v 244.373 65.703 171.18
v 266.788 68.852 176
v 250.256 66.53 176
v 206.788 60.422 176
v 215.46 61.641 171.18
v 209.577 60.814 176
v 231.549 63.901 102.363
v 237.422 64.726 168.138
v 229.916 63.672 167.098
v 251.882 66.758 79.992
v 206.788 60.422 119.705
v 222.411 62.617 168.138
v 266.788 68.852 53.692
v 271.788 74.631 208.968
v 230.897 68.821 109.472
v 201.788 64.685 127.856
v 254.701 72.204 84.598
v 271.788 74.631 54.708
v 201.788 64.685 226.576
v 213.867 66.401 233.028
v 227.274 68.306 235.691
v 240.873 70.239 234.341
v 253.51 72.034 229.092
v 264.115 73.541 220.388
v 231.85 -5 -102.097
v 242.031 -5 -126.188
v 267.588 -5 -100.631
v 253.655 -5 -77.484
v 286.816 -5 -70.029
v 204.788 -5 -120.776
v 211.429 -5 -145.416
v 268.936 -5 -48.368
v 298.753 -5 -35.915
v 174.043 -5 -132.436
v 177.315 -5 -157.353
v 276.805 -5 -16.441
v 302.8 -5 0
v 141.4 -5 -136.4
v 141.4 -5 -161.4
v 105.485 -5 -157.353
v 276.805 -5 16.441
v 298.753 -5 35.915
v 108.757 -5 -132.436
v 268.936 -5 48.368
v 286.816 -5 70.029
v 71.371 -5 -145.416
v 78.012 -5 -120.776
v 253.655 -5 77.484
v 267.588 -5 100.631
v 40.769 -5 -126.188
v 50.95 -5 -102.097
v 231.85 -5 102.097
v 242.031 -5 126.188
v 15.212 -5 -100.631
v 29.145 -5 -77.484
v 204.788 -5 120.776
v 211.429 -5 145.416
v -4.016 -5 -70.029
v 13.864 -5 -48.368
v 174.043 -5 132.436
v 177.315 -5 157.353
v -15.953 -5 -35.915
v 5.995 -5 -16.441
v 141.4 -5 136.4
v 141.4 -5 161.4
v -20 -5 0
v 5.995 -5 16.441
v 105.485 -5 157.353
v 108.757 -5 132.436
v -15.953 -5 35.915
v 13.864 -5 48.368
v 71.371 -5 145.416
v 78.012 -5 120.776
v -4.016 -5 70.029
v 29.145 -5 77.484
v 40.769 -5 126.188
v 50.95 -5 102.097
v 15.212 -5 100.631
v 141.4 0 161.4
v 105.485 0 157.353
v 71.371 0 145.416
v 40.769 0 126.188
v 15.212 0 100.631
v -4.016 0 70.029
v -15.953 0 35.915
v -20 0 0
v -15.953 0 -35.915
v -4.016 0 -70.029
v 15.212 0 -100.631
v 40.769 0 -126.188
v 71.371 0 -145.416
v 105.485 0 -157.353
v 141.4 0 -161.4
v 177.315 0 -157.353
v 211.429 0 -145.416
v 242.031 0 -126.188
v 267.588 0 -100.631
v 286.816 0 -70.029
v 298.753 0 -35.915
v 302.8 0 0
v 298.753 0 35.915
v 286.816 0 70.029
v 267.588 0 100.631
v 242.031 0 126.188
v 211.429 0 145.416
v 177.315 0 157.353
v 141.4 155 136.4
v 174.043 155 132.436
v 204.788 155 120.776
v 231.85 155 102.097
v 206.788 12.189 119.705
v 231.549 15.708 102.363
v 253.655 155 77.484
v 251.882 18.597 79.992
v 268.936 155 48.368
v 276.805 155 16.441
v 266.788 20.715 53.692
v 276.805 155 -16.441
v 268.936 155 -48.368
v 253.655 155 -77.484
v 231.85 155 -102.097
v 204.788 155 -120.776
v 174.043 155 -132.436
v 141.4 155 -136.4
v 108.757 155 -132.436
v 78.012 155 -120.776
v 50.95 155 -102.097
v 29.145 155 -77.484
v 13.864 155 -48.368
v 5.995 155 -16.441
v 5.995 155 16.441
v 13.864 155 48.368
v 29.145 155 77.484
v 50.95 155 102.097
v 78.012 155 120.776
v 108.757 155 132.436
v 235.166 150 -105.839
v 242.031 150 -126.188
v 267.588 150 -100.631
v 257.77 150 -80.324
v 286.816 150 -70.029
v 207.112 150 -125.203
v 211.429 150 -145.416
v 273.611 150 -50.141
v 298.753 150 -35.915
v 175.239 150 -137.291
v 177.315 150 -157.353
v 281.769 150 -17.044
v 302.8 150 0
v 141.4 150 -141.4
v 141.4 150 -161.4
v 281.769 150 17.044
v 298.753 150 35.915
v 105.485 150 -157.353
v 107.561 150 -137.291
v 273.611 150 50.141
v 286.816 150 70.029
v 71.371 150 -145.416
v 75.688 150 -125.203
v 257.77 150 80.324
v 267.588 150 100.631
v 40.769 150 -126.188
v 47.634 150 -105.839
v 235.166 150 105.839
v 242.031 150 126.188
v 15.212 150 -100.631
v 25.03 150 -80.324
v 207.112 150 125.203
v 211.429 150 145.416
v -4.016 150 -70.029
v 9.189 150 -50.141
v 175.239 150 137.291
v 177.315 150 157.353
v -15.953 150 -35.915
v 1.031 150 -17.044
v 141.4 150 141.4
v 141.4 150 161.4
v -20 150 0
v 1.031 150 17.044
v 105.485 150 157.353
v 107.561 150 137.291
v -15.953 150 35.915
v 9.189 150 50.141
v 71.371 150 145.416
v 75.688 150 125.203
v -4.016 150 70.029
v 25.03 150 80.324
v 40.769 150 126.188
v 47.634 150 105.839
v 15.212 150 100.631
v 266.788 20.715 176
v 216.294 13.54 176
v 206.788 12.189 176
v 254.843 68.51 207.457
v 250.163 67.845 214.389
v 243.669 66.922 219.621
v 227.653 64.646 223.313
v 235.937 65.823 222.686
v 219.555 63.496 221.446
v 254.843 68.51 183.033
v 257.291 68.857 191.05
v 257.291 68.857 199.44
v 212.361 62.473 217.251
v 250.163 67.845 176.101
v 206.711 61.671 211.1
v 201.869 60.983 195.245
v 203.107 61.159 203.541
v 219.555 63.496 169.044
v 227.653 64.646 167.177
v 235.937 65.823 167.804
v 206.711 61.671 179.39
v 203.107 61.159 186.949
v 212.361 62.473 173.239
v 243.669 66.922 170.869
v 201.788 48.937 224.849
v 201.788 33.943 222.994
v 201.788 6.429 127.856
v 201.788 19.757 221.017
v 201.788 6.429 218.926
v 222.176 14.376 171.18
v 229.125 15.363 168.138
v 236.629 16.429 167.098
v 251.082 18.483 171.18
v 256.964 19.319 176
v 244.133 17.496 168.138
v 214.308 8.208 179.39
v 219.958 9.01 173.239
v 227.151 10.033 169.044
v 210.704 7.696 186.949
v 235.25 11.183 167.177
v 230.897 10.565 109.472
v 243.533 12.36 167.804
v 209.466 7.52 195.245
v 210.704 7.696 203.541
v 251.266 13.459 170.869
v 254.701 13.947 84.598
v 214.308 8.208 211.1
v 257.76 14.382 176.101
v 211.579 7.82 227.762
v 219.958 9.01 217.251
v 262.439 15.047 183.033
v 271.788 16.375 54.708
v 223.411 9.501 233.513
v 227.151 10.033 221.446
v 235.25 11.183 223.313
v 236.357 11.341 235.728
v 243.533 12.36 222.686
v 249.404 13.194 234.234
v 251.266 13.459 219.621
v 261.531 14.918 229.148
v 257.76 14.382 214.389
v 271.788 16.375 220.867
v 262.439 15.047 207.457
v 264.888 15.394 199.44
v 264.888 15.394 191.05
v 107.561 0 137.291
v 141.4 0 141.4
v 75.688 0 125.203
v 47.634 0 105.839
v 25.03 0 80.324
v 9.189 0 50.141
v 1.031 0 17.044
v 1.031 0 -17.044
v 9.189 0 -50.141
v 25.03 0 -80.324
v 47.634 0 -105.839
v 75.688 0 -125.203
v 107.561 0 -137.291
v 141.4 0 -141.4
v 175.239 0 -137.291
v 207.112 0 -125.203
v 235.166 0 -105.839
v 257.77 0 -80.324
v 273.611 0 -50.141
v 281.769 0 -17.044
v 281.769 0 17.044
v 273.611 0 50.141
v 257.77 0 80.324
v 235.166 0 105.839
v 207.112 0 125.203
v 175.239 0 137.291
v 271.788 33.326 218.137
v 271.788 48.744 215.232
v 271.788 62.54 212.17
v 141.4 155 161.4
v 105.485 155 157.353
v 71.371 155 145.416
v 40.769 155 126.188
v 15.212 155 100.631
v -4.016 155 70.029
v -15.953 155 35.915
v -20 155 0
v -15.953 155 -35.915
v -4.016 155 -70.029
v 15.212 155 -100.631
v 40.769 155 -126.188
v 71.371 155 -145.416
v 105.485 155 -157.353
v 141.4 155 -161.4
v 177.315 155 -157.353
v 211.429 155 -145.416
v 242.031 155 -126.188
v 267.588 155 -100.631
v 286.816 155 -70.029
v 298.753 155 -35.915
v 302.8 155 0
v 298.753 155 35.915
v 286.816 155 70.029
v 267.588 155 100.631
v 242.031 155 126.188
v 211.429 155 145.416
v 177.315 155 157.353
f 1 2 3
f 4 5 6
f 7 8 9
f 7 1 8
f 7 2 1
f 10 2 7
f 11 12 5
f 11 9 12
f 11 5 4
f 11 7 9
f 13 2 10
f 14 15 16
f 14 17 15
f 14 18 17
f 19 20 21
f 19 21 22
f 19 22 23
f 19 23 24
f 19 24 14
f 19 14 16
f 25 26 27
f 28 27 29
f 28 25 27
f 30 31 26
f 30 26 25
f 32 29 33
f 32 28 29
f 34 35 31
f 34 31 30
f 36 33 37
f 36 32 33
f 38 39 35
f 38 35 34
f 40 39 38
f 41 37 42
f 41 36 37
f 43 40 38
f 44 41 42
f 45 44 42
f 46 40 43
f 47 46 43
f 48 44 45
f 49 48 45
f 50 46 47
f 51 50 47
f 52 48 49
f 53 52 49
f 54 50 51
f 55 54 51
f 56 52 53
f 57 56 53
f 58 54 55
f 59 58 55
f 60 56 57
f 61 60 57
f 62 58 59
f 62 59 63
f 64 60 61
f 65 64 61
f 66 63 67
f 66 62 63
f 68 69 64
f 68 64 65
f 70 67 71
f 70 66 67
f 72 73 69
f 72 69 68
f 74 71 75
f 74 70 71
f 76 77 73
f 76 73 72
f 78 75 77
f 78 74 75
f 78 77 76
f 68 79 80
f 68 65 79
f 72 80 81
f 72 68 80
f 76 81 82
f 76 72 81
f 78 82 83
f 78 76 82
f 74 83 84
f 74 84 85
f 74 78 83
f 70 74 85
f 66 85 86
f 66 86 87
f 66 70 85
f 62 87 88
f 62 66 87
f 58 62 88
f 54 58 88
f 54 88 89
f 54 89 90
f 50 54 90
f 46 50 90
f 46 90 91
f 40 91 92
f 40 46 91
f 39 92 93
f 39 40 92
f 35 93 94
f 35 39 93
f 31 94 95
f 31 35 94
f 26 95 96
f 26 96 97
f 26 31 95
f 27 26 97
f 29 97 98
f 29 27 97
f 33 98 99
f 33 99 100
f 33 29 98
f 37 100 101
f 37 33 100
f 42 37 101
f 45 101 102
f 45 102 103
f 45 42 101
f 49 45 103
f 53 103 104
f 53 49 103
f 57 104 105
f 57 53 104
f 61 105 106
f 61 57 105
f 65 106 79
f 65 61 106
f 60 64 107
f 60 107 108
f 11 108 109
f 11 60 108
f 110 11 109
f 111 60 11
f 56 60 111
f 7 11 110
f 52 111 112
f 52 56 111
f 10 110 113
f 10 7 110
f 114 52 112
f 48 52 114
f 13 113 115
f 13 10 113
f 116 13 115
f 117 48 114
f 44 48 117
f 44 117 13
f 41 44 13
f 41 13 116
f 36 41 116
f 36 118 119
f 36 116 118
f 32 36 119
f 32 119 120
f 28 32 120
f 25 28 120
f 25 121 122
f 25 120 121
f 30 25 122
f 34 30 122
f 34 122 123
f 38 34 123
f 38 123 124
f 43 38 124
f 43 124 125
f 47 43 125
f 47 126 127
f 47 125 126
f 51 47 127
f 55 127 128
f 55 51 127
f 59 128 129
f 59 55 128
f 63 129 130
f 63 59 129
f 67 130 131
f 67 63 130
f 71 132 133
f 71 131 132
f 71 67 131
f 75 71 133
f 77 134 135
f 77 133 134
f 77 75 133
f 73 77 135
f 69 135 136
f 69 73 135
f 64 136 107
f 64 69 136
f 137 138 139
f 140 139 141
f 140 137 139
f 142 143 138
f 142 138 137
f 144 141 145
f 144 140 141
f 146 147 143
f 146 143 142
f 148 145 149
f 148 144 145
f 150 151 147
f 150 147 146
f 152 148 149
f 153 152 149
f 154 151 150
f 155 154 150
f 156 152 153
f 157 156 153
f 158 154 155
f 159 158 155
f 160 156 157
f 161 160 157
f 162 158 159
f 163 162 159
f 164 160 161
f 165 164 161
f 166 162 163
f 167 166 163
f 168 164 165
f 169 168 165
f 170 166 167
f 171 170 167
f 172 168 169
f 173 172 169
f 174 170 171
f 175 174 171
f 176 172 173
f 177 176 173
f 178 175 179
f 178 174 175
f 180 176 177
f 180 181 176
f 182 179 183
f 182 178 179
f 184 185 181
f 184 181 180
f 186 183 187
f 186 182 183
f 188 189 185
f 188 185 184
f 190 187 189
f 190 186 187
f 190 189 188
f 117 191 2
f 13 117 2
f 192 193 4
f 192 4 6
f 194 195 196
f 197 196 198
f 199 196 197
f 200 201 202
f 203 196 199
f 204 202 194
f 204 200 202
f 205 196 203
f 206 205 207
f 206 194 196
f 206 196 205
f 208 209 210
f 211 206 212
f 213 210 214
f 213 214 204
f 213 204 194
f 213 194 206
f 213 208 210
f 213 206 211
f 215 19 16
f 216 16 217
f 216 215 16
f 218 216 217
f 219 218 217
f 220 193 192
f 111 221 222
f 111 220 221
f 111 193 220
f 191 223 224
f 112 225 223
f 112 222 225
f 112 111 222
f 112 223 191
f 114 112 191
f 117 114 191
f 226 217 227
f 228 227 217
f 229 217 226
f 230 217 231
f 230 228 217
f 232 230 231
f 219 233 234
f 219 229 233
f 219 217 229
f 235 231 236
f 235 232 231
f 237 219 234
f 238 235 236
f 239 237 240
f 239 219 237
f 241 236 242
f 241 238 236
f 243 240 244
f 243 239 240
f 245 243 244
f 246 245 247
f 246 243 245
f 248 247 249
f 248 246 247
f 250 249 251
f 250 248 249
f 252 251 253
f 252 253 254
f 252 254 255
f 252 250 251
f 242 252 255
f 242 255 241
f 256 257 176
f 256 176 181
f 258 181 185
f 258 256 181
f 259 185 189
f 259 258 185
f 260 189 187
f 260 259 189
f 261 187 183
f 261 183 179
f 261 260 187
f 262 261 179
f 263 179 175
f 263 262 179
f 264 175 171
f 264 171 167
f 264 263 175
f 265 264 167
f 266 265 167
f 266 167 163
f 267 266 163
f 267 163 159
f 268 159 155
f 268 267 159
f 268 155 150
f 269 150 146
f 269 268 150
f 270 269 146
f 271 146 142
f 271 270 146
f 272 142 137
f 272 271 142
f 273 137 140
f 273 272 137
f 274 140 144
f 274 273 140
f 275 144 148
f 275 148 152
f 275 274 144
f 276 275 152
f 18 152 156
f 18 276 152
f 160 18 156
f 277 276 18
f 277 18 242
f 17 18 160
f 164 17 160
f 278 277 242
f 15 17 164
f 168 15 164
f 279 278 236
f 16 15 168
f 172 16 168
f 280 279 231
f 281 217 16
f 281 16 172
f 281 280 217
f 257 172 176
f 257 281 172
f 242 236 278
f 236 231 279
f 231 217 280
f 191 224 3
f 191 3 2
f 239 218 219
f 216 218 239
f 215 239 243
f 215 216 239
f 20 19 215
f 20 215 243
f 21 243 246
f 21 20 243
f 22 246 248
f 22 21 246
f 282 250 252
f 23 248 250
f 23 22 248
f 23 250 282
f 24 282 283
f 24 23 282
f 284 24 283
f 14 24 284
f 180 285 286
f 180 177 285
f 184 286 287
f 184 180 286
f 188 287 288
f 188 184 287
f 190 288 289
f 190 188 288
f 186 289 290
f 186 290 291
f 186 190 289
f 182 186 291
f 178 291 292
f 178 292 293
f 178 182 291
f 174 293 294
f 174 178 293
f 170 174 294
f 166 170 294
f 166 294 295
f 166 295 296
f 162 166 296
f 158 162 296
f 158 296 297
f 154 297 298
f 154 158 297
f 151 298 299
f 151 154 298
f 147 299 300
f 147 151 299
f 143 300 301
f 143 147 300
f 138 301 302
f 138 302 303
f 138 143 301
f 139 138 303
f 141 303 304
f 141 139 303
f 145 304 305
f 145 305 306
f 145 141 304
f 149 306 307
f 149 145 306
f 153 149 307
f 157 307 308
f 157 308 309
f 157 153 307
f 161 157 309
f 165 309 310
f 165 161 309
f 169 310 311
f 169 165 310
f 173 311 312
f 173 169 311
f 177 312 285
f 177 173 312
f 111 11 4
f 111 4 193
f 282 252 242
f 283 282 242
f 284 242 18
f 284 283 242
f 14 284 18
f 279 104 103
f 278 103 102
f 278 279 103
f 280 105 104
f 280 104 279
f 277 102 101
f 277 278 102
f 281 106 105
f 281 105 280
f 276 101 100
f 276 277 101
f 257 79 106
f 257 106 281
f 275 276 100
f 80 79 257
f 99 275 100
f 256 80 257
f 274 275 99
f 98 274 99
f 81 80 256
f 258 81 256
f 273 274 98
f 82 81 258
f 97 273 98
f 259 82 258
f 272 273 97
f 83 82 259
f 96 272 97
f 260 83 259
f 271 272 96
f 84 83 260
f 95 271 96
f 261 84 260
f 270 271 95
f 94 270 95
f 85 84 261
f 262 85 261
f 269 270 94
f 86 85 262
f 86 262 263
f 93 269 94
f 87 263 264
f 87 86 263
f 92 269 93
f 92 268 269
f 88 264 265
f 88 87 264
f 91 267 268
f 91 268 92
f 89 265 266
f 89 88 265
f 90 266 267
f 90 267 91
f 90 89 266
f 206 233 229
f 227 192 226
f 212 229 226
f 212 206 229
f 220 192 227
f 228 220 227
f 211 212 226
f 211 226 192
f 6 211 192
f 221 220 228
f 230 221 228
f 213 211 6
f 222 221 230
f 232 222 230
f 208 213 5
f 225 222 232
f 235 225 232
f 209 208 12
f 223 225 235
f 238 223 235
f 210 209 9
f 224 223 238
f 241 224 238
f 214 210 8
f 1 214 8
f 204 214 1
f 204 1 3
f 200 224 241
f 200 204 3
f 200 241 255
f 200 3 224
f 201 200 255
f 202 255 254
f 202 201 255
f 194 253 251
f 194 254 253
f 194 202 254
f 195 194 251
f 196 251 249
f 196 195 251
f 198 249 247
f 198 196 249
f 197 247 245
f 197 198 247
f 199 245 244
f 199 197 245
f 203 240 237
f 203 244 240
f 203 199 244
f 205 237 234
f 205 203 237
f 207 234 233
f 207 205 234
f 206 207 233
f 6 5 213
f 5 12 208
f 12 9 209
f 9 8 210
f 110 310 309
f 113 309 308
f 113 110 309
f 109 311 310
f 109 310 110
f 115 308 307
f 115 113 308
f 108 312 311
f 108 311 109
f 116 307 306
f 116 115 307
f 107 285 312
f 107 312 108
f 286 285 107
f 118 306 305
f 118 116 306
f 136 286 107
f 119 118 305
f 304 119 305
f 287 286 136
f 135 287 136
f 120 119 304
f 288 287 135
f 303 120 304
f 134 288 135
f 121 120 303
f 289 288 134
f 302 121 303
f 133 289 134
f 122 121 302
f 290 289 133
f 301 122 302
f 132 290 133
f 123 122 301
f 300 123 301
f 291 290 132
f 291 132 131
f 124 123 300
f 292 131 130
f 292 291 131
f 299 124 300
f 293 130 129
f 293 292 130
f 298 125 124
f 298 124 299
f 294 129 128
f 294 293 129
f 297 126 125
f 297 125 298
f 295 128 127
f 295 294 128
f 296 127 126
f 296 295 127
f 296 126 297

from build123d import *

# Parameters (mm, degrees)
BOSS_EXTRUDE2_DEPTH     = 101
CUT_EXTRUDE3_DEPTH      = 427.519947779
CUT_EXTRUDE3_DEPTH_BACK = 427.519947779
CUT_EXTRUDE4_DEPTH      = 424.573467382
CUT_EXTRUDE4_DEPTH_BACK = 64
SKETCH5_R               = 28.146504222
CUT_EXTRUDE7_DEPTH      = 36
CUT_EXTRUDE7_DEPTH_BACK = 113
CUT_EXTRUDE8_DEPTH      = 414.870820929
CUT_EXTRUDE8_DEPTH_BACK = 414.870820929
SKETCH8_R               = 136.4


with BuildPart() as part:
    # Sketch1 → Revolve1 (revolve)
    with BuildSketch(Plane.XY, mode=Mode.PRIVATE) as revolve1_sk:
        Polygon((0, 0), (-20, 0), (-20, -5), (5, -5), (141.4, -5), (141.4, 150), (141.4, 155), (-20, 155), (-20, 150), (0, 150), align=None)
    revolve(revolve1_sk.sketch.rotate(Axis((141.4, 150, 0), (0, -1, 0)), 270), axis=Axis((141.4, 150, 0), (0, -1, 0)))

    # Sketch3 → Boss-Extrude2 (add, symmetric)
    with BuildSketch(Plane.XY.offset(140)):
        Polygon((271.787755102, 74.631332533), (201.787755102, 64.685114046), (201.787755102, 6.428691477), (271.787755102, 16.374909964), align=None)
    extrude(amount=BOSS_EXTRUDE2_DEPTH, both=True)

    # Sketch4 → Cut-Extrude3 (cut, two sides: drawn at the far end of the back side and taken through both)
    with BuildSketch(Plane(origin=(4.504708933, -31.703468583, 0), x_dir=(-0.9900557063765247, -0.1406758624330439, 0), z_dir=(0.1406758624330439, -0.9900557063765248, 0)).offset(-CUT_EXTRUDE3_DEPTH_BACK)):
        with BuildLine():
            Line((-283.0966697, -198.98279485), (-292.524457183, -243.549272165))
            Line((-292.524457183, -243.549272165), (-246.6966359, -274.042125065))
            Line((-246.6966359, -274.042125065), (-190.71002304, -274.042125065))
            Line((-190.71002304, -274.042125065), (-190.71002304, -198.98279485))
            ThreePointArc((-190.71002304, -198.98279485), (-236.90334637, -235.746084626), (-283.0966697, -198.98279485))
        make_face()
    extrude(amount=CUT_EXTRUDE3_DEPTH + CUT_EXTRUDE3_DEPTH_BACK, mode=Mode.SUBTRACT)

    # Sketch5 → Cut-Extrude4 (cut, two sides: drawn at the far end of the back side and taken through both)
    with BuildSketch(Plane(origin=(4.504708933, -31.703468583, 0), x_dir=(-0.9900557063765247, -0.1406758624330439, 0), z_dir=(0.1406758624330439, -0.9900557063765248, 0)).offset(-CUT_EXTRUDE4_DEPTH_BACK)):
        with Locations((-236.587007924, -195.244994695)):
            Circle(SKETCH5_R)
    extrude(amount=CUT_EXTRUDE4_DEPTH + CUT_EXTRUDE4_DEPTH_BACK, mode=Mode.SUBTRACT)

    # Sketch6 → Cut-Extrude7 (cut, two sides: drawn at the far end of the back side and taken through both)
    with BuildSketch(Plane.XY.offset(140).offset(-CUT_EXTRUDE7_DEPTH_BACK)):
        Polygon((206.787755102, 60.42244898), (206.787755102, 12.189356534), (266.787755102, 20.714686666), (266.787755102, 68.852201046), align=None)
    extrude(amount=CUT_EXTRUDE7_DEPTH + CUT_EXTRUDE7_DEPTH_BACK, mode=Mode.SUBTRACT)

    # Sketch8 → Cut-Extrude8 (cut, two sides: drawn at the far end of the back side and taken through both)
    with BuildSketch(Plane(origin=(0, 0, 0), x_dir=(1, 0, 0), z_dir=(0, 1, 0)).offset(-CUT_EXTRUDE8_DEPTH_BACK)):
        with Locations(Location((141.4, 0, 0), (0, 0, 270))):
            Circle(SKETCH8_R)
    extrude(amount=CUT_EXTRUDE8_DEPTH + CUT_EXTRUDE8_DEPTH_BACK, mode=Mode.SUBTRACT)


solid = part.part
